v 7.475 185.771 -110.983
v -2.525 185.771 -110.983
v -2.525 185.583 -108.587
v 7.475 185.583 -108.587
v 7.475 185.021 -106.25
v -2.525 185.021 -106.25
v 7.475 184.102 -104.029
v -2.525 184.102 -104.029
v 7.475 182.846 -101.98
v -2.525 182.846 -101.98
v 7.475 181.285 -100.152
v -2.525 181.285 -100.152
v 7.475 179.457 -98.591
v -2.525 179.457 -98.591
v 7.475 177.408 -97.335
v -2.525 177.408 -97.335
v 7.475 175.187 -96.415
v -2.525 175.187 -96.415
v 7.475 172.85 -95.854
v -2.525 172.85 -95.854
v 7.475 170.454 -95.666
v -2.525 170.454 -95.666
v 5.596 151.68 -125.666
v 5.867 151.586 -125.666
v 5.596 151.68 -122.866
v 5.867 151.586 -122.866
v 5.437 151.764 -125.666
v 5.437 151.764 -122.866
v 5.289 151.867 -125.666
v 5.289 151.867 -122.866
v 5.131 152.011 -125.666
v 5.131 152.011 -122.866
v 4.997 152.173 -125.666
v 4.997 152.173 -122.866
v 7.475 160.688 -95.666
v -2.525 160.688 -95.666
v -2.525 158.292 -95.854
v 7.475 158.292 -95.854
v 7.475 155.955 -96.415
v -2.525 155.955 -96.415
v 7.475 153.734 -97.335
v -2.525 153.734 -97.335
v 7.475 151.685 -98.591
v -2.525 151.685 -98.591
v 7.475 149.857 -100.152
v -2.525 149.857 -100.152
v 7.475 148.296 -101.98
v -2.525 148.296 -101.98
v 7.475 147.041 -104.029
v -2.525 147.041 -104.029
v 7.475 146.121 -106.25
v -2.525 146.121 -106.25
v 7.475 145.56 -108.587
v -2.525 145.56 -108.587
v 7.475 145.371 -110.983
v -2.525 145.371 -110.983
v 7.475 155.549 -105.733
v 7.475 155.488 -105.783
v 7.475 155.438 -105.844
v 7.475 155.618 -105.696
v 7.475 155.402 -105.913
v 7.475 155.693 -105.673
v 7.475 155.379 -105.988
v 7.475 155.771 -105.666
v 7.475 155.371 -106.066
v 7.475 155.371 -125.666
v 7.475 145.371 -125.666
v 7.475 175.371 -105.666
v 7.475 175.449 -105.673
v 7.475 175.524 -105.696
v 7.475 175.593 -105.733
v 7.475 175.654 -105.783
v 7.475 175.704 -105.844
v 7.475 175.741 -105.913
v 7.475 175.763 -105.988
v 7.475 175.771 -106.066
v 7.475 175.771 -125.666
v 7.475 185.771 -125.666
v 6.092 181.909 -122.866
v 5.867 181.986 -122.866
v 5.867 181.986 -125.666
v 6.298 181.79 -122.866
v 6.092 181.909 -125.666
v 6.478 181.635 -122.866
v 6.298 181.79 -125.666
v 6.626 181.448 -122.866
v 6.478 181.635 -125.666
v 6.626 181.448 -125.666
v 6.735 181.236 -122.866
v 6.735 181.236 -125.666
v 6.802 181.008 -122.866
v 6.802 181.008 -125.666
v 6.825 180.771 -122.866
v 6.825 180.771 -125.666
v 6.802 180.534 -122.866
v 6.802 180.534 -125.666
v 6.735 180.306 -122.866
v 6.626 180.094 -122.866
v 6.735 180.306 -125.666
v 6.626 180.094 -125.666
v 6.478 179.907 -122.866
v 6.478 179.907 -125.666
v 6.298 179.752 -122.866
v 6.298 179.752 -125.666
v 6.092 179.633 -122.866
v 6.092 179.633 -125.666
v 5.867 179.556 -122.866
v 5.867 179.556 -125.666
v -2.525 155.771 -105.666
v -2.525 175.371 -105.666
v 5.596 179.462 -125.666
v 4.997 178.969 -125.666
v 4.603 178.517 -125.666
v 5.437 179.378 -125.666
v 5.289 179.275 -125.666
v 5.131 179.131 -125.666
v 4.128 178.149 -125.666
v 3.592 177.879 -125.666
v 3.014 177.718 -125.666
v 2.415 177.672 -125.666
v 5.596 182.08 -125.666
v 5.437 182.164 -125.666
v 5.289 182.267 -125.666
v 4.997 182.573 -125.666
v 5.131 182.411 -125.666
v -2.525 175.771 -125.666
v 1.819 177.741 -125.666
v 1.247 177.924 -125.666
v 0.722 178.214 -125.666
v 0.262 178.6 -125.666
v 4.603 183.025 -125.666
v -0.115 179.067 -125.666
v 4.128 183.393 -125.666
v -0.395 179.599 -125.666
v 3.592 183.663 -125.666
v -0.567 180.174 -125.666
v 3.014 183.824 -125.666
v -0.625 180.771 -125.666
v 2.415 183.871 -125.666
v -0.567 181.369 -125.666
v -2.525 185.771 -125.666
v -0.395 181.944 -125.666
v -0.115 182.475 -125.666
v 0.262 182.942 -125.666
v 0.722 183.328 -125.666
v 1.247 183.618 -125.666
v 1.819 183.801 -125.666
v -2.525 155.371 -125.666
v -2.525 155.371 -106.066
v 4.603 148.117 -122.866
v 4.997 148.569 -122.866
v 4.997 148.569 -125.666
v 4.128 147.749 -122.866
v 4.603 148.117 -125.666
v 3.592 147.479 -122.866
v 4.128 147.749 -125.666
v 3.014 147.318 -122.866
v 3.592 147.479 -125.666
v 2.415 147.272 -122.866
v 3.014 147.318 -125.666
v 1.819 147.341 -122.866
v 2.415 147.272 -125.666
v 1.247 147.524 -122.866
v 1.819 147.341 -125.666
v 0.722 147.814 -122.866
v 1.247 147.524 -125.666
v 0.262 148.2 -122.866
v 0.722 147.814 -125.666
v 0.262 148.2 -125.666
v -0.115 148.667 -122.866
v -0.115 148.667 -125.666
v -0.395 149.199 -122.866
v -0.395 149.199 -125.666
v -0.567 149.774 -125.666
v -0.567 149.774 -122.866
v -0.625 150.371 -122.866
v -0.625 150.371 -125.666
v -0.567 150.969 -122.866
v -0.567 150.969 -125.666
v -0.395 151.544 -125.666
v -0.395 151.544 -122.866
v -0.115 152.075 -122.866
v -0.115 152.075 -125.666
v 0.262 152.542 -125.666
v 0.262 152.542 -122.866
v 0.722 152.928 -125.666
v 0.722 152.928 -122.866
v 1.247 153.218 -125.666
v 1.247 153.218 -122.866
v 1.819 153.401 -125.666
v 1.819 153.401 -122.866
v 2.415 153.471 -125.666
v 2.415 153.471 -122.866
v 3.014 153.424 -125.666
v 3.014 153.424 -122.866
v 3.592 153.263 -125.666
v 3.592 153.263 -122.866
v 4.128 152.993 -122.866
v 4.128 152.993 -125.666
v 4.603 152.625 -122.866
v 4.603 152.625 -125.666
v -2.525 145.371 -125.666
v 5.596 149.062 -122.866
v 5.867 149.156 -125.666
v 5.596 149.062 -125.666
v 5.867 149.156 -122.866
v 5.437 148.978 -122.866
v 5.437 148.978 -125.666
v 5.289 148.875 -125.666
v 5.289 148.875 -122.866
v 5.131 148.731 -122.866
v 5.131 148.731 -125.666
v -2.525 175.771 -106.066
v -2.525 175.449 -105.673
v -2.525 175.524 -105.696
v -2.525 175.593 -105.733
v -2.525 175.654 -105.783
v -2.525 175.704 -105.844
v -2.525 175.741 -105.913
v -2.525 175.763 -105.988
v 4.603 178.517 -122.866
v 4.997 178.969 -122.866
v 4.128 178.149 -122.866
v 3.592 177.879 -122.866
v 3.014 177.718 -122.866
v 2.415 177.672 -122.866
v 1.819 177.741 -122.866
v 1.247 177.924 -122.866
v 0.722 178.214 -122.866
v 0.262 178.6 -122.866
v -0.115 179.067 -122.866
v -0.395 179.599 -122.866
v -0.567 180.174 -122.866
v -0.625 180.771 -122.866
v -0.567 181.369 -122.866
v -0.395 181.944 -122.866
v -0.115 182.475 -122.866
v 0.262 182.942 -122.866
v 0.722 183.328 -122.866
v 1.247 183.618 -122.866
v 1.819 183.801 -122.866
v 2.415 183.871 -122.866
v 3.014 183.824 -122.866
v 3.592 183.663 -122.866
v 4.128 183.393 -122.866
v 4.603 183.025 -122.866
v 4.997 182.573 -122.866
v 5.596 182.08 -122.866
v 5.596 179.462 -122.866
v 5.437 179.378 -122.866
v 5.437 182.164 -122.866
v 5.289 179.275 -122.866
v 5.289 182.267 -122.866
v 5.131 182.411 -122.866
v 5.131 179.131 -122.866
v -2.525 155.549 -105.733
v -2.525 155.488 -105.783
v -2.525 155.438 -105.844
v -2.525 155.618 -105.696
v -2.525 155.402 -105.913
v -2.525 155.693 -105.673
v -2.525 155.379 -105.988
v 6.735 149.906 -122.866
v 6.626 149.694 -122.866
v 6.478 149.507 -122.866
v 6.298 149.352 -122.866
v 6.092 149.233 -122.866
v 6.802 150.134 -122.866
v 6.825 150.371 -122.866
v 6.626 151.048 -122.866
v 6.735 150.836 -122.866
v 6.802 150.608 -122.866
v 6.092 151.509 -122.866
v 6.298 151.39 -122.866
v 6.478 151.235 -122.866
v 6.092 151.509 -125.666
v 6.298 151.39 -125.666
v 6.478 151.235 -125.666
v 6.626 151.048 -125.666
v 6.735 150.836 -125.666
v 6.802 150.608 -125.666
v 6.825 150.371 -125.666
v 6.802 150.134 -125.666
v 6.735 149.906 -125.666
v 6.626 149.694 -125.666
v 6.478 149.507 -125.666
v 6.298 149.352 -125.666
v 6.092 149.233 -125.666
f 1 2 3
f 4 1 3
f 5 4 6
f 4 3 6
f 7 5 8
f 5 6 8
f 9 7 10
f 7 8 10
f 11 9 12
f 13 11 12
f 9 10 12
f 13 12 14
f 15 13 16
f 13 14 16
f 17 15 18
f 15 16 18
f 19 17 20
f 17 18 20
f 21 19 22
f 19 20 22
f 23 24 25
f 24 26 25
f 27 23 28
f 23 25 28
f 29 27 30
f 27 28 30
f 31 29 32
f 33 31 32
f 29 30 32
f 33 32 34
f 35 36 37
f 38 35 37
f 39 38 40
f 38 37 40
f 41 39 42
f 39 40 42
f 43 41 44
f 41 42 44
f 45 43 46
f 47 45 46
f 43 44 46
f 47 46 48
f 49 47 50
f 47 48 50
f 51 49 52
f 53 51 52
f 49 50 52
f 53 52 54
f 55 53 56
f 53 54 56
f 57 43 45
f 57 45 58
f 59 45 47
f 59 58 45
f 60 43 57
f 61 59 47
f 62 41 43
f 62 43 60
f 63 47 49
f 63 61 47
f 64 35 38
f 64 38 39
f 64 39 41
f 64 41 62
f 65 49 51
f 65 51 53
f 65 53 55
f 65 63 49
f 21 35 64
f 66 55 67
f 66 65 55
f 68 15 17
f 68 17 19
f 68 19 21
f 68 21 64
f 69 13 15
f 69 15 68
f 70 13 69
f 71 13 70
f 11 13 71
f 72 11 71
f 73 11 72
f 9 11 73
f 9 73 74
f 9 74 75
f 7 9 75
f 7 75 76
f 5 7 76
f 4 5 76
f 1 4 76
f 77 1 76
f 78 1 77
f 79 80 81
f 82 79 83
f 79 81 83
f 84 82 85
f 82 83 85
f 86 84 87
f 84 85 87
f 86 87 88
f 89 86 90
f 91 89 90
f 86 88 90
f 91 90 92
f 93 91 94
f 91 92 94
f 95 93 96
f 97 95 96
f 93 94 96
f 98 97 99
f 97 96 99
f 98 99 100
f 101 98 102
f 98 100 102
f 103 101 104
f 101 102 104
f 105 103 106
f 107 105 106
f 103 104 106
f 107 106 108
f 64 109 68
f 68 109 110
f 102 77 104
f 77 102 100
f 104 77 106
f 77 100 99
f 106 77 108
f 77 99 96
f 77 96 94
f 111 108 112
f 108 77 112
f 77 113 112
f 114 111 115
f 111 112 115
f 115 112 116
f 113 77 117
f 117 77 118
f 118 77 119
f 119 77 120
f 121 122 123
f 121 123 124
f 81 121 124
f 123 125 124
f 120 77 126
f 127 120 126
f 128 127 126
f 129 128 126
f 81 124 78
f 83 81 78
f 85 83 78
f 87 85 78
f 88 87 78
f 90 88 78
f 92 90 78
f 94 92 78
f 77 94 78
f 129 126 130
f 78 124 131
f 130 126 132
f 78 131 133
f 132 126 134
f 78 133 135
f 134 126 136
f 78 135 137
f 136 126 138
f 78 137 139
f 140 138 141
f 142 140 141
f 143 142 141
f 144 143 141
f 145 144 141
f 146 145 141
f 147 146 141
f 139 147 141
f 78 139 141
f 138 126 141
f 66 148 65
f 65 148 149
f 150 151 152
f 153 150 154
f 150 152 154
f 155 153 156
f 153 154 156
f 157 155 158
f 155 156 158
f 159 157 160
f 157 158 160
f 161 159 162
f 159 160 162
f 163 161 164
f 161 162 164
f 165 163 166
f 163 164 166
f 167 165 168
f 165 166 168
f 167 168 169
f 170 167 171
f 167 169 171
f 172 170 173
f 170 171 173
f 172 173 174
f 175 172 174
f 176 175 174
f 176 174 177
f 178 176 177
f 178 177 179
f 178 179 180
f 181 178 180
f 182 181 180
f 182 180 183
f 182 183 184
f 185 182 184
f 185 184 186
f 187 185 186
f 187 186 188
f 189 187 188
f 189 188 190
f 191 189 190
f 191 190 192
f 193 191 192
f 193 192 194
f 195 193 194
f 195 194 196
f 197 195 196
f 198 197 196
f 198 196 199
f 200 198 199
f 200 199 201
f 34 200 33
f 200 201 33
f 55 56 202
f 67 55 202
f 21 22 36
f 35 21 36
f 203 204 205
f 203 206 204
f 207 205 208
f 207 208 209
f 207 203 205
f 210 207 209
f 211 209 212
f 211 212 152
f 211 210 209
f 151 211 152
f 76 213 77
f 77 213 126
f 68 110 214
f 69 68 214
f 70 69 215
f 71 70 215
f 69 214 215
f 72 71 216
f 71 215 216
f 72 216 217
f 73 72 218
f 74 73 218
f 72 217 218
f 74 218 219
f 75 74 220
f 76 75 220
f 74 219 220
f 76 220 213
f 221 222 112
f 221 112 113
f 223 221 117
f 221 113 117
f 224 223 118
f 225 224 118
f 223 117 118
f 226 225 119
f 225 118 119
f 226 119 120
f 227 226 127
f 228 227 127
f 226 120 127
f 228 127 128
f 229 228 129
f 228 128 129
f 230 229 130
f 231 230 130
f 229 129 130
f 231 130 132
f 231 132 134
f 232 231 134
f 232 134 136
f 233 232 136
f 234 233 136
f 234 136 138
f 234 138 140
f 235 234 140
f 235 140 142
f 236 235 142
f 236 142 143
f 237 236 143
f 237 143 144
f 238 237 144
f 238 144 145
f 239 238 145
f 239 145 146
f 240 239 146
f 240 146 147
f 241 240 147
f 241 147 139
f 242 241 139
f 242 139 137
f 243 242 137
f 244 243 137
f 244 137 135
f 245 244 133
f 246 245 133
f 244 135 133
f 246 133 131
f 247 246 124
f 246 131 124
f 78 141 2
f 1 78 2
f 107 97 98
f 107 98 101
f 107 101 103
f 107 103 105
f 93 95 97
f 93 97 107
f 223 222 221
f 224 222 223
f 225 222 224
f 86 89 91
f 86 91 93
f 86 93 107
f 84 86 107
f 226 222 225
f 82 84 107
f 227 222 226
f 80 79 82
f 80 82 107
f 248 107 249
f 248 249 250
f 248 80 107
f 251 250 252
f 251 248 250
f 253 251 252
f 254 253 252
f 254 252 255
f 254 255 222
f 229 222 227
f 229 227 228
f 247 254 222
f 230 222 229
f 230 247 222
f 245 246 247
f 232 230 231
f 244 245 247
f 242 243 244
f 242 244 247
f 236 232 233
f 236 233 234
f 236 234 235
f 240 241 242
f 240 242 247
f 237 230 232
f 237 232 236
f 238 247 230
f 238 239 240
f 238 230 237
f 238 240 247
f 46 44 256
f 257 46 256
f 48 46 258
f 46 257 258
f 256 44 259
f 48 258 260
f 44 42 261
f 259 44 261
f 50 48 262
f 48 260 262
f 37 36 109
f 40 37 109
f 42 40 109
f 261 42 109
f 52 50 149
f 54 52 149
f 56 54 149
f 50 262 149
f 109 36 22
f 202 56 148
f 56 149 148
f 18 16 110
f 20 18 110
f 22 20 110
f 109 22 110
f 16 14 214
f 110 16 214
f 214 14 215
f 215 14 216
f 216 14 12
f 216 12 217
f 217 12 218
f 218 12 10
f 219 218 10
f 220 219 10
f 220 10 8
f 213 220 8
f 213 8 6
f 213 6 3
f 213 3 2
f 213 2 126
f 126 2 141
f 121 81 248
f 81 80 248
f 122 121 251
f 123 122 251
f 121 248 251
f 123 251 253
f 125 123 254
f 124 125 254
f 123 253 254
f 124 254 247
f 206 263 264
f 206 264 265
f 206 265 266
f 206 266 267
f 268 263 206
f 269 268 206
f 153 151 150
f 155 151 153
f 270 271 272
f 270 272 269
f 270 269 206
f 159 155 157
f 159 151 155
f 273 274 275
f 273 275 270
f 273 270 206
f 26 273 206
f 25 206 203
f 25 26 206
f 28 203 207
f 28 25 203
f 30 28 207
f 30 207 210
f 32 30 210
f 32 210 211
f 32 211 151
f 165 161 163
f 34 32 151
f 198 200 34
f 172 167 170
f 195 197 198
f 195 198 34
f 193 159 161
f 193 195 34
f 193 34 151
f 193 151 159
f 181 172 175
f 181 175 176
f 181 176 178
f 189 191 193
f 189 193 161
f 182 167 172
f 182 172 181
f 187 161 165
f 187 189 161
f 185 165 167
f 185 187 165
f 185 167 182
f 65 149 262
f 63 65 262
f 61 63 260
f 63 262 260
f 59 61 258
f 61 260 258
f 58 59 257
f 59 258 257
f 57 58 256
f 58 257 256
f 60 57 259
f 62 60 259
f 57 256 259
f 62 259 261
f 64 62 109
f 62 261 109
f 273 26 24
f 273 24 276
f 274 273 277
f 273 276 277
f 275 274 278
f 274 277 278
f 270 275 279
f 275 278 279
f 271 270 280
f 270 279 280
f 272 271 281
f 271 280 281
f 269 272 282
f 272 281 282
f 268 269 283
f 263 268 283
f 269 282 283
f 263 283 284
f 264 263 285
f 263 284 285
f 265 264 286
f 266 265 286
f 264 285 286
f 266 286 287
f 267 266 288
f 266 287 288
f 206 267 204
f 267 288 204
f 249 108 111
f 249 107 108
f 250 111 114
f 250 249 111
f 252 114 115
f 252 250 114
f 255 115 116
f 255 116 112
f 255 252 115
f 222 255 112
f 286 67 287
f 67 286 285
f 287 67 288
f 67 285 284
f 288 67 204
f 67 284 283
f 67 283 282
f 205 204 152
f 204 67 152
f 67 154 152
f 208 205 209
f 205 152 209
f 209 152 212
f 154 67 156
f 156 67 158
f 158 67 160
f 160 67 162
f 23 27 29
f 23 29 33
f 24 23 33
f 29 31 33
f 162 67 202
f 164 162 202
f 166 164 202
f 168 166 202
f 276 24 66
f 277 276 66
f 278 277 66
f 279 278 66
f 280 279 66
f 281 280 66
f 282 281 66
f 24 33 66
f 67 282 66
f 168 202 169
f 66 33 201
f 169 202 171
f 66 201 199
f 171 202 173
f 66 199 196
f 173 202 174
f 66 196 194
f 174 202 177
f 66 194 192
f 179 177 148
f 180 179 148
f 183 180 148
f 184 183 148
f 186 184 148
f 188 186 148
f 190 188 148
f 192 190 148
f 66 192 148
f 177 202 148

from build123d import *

# Parameters (mm, degrees)
SALIENTE_EXTRUIR1_DEPTH = 10
CORTAR_EXTRUIR1_DEPTH   = 4
REDONDEO2_R             = 1.5


with BuildPart() as part:
    # Croquis2 → Saliente-Extruir1 (new body)
    with BuildSketch(Plane(origin=(-2.525360123, 2.123276243, -2.466894012), x_dir=(0, 0, -1), z_dir=(1, 0, 0))):
        with BuildLine():
            Line((103.598862982, 173.647805519), (108.516020269, 173.647805519))
            Line((108.516020269, 173.647805519), (118.281705694, 173.647805519))
            Line((118.281705694, 173.647805519), (123.198862982, 173.647805519))
            Line((123.198862982, 173.647805519), (123.198862982, 183.647805519))
            Line((123.198862982, 183.647805519), (118.281705694, 183.647805519))
            Line((118.281705694, 183.647805519), (108.516020269, 183.647805519))
            ThreePointArc((108.516020269, 183.647805519), (97.685154483, 179.161514018), (93.198862982, 168.330648231))
            Line((93.198862982, 168.330648231), (93.198862982, 158.564962806))
            ThreePointArc((93.198862982, 158.564962806), (97.685154483, 147.73409702), (108.516020269, 143.247805519))
            Line((108.516020269, 143.247805519), (118.281705694, 143.247805519))
            Line((118.281705694, 143.247805519), (123.198862982, 143.247805519))
            Line((123.198862982, 143.247805519), (123.198862982, 153.247805519))
            Line((123.198862982, 153.247805519), (118.281705694, 153.247805519))
            Line((118.281705694, 153.247805519), (108.516020269, 153.247805519))
            Line((108.516020269, 153.247805519), (103.598862982, 153.247805519))
            ThreePointArc((103.598862982, 153.247805519), (103.316020269, 153.364962806), (103.198862982, 153.647805519))
            Line((103.198862982, 153.647805519), (103.198862982, 158.564962806))
            Line((103.198862982, 158.564962806), (103.198862982, 168.330648231))
            Line((103.198862982, 168.330648231), (103.198862982, 173.247805519))
            ThreePointArc((103.198862982, 173.247805519), (103.316020269, 173.530648231), (103.598862982, 173.647805519))
        make_face()
    extrude(amount=SALIENTE_EXTRUIR1_DEPTH)

    # Croquis3 → Cortar-Extruir1 (cut)
    with BuildSketch(Plane(origin=(0, 0, -126.865756994), x_dir=(-1, 0, 0), z_dir=(0, 0, -1))):
        with BuildLine():
            ThreePointArc((-5.322623748, 181.995413363), (-6.824639877, 180.771081761), (-5.322623748, 179.54675016))
            ThreePointArc((-5.322623748, 179.54675016), (0.625360123, 180.771081761), (-5.322623748, 181.995413363))
        make_face()
        with BuildLine():
            ThreePointArc((-5.322623748, 151.595413363), (-6.824639877, 150.371081761), (-5.322623748, 149.14675016))
            ThreePointArc((-5.322623748, 149.14675016), (0.625360123, 150.371081761), (-5.322623748, 151.595413363))
        make_face()
    extrude(amount=-CORTAR_EXTRUIR1_DEPTH, mode=Mode.SUBTRACT)

    # Redondeo2
    redondeo2_edges = [part.edges().sort_by_distance(p)[0] for p in [
        (5.322623748, 181.995413363, -124.265756994),
        (5.322623748, 179.54675016, -124.265756994),
        (5.322623748, 151.595413363, -124.265756994),
        (5.322623748, 149.14675016, -124.265756994),
    ]]
    fillet(redondeo2_edges, radius=REDONDEO2_R)


solid = part.part
